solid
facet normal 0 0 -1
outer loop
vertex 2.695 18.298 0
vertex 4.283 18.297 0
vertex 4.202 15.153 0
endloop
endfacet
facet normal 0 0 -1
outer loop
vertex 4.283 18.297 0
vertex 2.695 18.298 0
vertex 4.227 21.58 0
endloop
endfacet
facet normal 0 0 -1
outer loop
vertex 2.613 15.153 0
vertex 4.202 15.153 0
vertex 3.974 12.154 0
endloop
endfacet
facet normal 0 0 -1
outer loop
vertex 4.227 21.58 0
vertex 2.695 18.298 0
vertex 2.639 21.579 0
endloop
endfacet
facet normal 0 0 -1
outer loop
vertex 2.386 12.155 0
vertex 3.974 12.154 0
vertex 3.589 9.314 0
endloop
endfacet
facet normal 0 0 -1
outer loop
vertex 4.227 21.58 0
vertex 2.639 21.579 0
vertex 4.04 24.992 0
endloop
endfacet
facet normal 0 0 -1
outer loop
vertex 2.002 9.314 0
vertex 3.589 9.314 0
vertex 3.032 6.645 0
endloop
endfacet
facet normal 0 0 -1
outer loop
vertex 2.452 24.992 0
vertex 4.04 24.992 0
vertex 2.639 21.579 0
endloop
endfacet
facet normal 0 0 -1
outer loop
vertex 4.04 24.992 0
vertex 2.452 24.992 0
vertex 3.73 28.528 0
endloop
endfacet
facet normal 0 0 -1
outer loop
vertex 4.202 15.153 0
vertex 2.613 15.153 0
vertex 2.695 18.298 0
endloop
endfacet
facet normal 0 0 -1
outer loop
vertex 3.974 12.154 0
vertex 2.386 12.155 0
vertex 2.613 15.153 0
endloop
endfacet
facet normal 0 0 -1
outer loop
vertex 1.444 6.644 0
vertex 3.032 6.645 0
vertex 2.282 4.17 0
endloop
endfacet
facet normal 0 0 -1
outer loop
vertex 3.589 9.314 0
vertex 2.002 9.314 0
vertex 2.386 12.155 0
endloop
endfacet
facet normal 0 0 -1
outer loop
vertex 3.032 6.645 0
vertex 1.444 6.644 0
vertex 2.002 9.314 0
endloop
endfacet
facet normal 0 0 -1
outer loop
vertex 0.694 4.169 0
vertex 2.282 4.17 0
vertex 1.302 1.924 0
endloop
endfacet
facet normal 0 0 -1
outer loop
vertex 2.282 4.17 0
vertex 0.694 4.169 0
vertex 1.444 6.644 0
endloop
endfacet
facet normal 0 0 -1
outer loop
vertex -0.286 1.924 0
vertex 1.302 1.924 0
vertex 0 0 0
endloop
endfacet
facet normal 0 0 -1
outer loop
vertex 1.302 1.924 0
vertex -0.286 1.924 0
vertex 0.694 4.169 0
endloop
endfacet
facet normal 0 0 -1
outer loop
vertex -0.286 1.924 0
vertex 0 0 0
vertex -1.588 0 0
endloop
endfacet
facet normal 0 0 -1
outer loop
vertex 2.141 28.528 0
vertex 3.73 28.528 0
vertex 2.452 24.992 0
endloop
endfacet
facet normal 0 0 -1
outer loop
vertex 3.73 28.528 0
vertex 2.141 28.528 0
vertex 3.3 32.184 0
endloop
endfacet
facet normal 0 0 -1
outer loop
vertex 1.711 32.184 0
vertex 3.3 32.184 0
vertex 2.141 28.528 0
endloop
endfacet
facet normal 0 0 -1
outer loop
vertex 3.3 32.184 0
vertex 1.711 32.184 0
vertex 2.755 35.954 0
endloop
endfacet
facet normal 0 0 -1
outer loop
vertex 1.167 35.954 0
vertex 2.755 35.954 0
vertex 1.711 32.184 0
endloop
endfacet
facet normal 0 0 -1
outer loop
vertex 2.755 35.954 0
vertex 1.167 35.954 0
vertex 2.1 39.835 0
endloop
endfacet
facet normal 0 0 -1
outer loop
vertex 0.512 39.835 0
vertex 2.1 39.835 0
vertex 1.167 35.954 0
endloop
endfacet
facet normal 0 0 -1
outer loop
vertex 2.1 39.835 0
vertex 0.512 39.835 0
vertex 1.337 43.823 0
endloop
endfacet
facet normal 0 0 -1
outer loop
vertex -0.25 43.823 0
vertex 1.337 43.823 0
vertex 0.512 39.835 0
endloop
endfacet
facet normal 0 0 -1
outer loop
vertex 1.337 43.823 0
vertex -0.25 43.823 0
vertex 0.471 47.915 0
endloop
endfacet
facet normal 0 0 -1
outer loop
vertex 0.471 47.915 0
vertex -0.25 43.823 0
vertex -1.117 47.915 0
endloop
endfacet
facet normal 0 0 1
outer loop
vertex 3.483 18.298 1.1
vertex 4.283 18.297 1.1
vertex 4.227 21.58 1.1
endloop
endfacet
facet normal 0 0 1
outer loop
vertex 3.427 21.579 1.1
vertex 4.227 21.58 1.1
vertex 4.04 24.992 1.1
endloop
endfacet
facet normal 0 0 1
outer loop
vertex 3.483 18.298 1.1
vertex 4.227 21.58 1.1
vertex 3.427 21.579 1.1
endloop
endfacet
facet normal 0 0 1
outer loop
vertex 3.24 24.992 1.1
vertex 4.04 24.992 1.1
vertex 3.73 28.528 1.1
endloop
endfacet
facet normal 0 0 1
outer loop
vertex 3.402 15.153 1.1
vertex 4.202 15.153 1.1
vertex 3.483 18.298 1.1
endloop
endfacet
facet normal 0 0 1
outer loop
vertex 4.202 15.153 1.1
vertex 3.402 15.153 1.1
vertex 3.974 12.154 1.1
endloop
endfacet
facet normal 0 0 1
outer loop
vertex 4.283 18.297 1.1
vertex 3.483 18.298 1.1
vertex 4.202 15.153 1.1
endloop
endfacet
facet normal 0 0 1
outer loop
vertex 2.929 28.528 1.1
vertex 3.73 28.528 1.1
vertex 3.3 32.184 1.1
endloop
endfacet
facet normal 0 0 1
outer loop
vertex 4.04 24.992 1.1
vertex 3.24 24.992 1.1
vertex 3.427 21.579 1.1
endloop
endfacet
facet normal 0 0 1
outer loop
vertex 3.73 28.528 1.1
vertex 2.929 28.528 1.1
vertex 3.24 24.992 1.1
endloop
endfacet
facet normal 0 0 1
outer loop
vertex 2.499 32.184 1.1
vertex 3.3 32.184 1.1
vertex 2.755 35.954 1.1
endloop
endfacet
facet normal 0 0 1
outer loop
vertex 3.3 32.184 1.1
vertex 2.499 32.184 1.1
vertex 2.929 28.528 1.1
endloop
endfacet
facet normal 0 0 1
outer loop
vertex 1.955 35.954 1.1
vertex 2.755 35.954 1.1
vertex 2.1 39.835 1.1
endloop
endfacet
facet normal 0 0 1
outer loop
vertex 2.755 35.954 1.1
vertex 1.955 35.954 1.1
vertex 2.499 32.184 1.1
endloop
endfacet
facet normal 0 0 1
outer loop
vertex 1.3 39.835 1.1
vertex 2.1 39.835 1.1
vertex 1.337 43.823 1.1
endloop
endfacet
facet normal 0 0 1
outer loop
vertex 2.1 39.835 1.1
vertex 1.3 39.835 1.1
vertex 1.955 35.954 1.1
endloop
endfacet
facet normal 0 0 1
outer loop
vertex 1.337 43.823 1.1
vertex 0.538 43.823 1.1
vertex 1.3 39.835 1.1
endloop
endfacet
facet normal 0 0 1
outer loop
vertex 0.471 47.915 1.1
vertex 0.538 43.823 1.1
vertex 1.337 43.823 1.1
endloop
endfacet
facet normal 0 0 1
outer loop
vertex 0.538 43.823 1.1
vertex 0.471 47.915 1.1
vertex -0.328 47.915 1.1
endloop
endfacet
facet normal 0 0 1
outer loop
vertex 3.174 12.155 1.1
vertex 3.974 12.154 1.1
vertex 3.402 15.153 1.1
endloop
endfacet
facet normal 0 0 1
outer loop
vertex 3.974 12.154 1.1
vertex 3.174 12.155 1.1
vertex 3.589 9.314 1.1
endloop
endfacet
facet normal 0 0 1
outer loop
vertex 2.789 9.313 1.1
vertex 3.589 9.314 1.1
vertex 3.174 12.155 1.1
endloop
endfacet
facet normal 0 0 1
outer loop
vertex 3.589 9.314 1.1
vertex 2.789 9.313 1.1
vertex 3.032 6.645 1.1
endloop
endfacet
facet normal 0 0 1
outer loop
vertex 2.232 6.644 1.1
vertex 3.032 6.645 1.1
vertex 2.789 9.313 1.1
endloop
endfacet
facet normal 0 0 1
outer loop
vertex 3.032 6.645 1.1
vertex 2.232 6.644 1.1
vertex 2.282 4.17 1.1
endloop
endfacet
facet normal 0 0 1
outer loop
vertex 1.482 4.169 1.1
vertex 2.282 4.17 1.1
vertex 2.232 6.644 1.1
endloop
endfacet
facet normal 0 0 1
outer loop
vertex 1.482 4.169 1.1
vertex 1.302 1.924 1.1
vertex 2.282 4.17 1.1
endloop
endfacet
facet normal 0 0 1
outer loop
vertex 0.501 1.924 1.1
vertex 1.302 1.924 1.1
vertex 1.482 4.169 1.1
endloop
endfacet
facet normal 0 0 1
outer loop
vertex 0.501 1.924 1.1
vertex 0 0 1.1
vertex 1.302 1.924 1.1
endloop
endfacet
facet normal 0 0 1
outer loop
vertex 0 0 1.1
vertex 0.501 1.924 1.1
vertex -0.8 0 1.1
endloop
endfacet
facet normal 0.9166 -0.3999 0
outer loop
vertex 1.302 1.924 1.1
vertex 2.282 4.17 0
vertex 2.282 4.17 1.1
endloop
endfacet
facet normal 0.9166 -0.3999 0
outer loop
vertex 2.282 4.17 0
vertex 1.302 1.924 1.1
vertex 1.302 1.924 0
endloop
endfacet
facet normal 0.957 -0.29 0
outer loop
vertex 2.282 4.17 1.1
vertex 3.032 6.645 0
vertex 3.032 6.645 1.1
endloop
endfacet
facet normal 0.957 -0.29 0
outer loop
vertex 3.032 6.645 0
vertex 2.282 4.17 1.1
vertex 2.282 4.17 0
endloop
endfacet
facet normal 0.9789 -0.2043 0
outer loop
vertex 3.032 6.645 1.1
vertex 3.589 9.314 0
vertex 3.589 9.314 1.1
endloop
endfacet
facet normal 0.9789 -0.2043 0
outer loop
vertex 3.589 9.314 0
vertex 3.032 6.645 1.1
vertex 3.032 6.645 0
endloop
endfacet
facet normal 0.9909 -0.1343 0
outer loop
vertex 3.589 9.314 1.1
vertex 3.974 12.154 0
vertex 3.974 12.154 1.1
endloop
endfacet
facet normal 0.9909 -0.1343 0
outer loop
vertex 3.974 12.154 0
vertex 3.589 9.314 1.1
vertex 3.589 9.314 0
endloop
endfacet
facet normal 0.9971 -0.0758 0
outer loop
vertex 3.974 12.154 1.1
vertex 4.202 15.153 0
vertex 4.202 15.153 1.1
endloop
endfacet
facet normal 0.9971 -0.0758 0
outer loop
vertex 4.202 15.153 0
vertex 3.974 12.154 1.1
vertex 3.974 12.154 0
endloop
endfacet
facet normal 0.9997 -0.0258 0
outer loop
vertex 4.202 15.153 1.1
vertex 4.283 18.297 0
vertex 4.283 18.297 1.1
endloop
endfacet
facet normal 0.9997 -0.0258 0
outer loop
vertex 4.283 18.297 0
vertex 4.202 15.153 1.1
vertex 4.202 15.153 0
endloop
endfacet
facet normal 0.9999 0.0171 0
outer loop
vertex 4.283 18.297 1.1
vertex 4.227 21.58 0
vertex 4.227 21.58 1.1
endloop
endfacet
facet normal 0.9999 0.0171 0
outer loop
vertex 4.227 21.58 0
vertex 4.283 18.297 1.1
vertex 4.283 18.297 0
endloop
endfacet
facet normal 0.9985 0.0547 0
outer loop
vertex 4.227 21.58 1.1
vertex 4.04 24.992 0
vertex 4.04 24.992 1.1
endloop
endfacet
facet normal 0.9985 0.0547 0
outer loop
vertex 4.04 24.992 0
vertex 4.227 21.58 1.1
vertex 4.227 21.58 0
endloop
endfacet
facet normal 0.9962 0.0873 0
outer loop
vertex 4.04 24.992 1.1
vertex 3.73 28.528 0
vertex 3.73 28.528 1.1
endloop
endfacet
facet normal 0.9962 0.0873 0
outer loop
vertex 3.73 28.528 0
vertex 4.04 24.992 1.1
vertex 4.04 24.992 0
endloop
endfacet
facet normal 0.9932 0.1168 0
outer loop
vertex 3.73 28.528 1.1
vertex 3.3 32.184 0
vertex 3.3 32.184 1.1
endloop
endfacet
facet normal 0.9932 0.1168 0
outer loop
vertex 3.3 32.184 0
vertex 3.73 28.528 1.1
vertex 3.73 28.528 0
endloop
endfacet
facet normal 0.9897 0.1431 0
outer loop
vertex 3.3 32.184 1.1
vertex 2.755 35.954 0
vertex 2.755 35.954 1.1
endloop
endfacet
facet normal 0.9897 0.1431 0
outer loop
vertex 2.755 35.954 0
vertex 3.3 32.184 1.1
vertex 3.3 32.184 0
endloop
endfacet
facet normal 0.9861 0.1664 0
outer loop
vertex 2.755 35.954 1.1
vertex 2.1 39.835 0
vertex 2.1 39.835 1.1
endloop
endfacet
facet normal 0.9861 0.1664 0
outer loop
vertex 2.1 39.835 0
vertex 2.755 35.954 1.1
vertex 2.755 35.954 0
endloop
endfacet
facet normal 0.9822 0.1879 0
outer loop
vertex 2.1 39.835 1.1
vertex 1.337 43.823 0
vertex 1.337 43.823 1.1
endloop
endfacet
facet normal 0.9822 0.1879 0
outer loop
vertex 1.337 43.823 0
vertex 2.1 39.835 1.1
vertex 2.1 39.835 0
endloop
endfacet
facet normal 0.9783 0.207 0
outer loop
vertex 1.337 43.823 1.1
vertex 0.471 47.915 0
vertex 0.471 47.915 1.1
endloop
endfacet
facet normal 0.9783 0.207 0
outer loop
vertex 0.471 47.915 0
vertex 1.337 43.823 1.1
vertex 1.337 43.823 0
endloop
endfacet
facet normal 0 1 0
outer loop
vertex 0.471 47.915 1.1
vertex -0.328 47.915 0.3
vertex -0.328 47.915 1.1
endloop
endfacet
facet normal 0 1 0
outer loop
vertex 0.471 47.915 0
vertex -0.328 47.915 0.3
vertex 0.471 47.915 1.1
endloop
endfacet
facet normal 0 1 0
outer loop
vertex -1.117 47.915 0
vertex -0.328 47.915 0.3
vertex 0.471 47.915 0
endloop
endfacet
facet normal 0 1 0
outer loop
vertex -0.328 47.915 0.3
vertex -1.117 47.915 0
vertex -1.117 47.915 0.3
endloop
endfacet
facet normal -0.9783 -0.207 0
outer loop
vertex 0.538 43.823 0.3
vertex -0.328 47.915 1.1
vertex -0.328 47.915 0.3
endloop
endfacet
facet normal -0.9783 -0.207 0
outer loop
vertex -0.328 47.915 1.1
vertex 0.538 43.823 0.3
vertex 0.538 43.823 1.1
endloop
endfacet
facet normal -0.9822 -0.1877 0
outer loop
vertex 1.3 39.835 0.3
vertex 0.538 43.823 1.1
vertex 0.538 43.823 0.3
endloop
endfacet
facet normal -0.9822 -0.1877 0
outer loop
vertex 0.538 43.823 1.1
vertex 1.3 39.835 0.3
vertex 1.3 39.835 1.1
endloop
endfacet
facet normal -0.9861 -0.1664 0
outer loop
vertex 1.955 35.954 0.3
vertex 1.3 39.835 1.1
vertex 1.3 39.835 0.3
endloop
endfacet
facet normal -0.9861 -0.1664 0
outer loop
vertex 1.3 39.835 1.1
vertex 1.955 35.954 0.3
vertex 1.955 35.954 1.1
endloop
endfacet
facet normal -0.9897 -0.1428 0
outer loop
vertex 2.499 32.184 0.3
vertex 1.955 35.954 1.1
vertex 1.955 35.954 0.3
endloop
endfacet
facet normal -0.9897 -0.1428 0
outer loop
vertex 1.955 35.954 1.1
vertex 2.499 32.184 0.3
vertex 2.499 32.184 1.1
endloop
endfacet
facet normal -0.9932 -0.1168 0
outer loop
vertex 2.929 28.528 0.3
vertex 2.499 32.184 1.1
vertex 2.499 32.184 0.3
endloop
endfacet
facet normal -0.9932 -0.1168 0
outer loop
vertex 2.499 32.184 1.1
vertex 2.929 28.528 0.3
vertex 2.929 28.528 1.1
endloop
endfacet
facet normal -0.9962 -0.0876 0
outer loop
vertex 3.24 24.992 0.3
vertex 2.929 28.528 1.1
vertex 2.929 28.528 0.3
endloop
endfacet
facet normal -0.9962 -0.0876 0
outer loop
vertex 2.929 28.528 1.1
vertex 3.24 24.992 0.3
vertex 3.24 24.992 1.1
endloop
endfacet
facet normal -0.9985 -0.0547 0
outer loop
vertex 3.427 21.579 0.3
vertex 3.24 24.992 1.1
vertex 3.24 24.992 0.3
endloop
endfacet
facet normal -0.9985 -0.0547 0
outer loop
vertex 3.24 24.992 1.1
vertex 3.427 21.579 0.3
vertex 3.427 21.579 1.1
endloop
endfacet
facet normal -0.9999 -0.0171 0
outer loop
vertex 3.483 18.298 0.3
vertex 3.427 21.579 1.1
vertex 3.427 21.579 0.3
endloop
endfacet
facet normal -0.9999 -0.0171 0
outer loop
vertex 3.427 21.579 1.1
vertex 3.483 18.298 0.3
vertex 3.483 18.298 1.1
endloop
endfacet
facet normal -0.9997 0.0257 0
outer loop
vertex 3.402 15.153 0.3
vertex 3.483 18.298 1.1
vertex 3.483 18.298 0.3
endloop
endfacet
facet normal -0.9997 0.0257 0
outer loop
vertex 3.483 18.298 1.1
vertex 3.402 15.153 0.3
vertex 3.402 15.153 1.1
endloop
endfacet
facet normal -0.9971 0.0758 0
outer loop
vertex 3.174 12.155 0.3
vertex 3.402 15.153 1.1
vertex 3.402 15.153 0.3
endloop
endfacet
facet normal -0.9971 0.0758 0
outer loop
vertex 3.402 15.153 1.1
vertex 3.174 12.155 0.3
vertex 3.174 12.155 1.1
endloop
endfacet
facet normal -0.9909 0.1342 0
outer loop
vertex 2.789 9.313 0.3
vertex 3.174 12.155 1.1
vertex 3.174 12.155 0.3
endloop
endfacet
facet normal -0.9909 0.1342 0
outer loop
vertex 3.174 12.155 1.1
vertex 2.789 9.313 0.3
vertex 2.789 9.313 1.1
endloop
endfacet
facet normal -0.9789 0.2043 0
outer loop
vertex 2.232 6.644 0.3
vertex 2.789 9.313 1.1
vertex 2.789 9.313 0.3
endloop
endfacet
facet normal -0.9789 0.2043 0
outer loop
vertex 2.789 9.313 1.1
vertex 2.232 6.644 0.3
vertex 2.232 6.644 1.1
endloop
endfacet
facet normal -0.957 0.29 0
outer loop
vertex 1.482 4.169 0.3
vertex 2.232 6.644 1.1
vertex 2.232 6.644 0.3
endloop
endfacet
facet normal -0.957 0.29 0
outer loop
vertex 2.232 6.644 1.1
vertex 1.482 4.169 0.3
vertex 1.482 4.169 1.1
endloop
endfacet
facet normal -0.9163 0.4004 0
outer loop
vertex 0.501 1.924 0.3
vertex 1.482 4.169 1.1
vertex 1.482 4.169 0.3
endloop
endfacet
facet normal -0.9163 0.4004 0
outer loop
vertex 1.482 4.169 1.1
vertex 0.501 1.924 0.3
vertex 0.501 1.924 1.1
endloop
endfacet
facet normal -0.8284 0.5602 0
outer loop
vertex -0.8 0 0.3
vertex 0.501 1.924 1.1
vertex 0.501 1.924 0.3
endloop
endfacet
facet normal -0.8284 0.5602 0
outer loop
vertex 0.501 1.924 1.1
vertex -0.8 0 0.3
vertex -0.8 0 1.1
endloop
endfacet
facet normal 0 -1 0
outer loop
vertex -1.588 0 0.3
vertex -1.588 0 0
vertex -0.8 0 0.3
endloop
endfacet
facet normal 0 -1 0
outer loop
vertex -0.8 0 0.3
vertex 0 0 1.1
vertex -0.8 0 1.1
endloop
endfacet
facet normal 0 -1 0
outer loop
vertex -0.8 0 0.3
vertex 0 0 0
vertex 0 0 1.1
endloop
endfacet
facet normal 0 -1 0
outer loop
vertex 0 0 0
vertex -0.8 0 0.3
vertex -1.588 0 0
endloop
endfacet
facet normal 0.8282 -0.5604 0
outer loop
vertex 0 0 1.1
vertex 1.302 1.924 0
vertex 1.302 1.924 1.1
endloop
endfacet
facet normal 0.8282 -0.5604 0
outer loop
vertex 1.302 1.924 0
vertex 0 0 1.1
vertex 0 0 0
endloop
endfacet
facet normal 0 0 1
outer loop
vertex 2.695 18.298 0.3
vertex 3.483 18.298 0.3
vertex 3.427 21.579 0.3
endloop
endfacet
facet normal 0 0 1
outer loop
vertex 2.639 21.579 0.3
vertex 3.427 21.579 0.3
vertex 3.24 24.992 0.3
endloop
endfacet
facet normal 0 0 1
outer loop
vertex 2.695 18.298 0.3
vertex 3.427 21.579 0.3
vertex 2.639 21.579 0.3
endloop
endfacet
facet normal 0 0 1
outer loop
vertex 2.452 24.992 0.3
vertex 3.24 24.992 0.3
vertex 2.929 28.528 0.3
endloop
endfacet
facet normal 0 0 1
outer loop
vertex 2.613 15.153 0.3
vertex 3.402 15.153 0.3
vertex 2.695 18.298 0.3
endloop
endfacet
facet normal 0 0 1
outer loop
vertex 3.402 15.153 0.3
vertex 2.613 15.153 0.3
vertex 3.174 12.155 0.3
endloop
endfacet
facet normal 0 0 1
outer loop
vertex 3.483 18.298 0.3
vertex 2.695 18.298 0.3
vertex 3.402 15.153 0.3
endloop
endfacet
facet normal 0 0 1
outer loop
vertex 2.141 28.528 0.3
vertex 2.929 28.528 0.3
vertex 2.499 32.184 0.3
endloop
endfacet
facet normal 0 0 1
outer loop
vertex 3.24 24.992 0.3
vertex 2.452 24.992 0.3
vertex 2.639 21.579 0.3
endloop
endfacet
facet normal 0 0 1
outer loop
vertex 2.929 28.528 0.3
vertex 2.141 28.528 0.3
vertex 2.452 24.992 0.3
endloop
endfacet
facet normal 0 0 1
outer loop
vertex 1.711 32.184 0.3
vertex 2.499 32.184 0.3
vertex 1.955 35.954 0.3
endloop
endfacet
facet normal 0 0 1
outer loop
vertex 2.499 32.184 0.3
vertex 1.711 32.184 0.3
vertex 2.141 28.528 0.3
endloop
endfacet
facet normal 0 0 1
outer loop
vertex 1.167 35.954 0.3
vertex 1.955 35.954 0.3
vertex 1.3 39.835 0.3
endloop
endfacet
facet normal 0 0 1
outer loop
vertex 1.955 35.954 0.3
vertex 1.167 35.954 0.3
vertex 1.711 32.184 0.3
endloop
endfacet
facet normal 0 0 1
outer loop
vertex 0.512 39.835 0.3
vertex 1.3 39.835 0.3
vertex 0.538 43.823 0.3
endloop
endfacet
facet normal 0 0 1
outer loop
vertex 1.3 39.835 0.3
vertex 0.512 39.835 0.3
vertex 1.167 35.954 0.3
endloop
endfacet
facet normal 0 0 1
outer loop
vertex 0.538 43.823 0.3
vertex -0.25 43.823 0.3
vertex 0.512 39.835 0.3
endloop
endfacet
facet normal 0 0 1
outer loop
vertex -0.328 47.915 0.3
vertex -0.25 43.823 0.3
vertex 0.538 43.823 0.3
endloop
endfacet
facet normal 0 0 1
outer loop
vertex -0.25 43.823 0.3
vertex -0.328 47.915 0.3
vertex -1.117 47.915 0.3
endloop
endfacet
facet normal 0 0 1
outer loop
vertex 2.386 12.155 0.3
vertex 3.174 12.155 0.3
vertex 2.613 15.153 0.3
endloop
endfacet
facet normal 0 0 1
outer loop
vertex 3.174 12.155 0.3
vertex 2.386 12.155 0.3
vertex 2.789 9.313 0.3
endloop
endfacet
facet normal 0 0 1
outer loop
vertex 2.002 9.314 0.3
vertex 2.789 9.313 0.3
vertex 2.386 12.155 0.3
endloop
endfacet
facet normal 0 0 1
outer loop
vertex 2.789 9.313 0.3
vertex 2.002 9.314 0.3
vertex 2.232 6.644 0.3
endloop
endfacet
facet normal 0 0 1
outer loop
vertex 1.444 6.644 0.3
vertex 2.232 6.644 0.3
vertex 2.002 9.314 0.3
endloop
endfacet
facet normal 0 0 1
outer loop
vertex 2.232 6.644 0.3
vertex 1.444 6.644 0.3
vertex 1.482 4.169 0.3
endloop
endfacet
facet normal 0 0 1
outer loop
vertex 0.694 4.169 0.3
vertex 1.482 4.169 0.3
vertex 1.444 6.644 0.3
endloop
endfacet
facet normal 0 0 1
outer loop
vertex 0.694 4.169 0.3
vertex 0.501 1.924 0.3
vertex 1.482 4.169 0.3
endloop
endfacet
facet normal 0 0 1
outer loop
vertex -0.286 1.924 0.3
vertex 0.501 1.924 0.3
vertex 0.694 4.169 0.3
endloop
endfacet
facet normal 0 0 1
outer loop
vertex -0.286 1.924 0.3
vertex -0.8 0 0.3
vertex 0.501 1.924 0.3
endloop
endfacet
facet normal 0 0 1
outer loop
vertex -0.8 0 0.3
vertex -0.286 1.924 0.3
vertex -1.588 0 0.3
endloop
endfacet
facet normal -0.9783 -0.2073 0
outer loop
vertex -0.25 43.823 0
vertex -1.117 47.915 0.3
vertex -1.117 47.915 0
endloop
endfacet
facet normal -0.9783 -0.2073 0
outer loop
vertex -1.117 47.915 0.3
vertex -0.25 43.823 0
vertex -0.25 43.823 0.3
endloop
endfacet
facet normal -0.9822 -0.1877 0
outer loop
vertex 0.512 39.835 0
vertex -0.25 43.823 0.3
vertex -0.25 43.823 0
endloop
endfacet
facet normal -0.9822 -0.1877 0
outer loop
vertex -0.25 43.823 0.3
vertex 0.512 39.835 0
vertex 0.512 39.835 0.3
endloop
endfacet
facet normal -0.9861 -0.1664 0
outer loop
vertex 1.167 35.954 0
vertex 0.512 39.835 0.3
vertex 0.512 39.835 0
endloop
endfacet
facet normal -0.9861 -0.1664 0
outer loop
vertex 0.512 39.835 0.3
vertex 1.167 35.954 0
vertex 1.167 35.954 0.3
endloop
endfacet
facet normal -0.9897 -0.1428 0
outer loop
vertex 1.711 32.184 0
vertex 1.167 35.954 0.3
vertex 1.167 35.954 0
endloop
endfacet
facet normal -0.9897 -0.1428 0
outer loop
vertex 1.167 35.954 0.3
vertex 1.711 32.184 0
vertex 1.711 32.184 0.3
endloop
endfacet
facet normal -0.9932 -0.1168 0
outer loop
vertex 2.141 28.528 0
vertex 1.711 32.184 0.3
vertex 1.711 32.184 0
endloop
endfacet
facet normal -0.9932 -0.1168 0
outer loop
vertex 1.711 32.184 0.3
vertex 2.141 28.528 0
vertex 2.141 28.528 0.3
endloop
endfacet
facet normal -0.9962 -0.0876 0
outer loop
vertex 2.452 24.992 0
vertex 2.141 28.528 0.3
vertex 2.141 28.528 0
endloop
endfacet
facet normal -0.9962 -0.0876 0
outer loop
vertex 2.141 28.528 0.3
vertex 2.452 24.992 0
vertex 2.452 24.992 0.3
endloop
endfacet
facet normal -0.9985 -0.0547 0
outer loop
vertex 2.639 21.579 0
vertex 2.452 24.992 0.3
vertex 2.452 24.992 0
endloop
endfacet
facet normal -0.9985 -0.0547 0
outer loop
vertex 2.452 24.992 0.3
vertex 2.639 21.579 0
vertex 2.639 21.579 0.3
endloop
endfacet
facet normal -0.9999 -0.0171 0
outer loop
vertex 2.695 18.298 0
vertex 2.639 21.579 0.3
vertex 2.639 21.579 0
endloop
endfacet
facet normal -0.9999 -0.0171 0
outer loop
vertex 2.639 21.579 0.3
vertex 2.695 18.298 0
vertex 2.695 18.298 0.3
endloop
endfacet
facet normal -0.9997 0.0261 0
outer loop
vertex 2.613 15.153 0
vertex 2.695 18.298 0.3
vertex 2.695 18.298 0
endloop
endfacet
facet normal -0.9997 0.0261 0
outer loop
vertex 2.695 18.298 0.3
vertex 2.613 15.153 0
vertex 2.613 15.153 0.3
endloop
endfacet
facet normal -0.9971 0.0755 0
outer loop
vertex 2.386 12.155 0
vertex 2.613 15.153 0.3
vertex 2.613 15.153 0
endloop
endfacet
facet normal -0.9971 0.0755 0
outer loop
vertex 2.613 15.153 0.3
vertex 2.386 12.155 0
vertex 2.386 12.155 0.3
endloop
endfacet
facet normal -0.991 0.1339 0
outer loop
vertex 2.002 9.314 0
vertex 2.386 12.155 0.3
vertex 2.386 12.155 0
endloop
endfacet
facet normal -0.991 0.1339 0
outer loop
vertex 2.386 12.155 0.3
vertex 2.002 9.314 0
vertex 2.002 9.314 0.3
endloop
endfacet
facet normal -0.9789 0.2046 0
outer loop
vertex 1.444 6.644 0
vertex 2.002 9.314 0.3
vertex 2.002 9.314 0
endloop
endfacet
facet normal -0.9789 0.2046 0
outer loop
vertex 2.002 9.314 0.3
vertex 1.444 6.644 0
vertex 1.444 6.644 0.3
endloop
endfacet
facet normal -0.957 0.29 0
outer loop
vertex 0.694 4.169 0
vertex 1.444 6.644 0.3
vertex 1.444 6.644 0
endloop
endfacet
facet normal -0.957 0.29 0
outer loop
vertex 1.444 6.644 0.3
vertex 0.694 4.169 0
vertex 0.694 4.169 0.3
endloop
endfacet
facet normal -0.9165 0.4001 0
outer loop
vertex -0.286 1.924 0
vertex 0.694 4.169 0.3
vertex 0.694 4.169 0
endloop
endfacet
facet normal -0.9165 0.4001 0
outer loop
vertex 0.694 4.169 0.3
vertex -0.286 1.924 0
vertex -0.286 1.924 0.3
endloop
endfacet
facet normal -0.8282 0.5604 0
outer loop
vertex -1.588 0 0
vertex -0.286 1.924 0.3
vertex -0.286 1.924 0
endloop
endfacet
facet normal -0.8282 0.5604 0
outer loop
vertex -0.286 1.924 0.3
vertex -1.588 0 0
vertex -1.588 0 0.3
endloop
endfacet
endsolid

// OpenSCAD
length = 50;
shape = 1.6;
height = 1.588;
width = .8;
thickness = 1.1;
brimthickness = .3;
reverse = false;

function f(x) = pow(x,shape);
module aerofoil(a,b,w,h,res) {
    xscale = (b-a)/res;
    for(x = [a:xscale:b]) {
        translate([x*x,x,0]) {
            rotate([0,0,45]) cube([xscale,w,h]);
        }
    }
}

scaler = length/sqrt(2);

scale(scaler) {
    if(!reverse) {
        aerofoil1(0,2,width/scaler,thickness/scaler,31); //top
        aerofoil1(0,2,height/scaler,brimthickness/scaler,31); //bottom
    }
    else {
        rotate([0,180,0]) {
            translate([0,0,-thickness/scaler]) aerofoil1(0,2,width/scaler,thickness/scaler,31); //top
            translate([0,0,-brimthickness/scaler]) aerofoil1(0,2,height/scaler, brimthickness/scaler,31); //bottom
        }
    }
}

//rotate([0,0,45]) cube([.4,1.6,1.1]);
//translate([scaler-1.2, scaler-2.2,0]) rotate([0,0,45]) cube([.4,1.6,1.1]);
module aerofoil1(a,b,w,h,res) {
    xscale = (b-a)/res;
    list = [for(x=[a:xscale:b]) x < (b-a)/2 ?  [x, f(x)] : [2-x-w/sqrt(2), f(2-x)+w/sqrt(2)]];
    rotate([0,0,45]) linear_extrude(h) {polygon(list);}
}
